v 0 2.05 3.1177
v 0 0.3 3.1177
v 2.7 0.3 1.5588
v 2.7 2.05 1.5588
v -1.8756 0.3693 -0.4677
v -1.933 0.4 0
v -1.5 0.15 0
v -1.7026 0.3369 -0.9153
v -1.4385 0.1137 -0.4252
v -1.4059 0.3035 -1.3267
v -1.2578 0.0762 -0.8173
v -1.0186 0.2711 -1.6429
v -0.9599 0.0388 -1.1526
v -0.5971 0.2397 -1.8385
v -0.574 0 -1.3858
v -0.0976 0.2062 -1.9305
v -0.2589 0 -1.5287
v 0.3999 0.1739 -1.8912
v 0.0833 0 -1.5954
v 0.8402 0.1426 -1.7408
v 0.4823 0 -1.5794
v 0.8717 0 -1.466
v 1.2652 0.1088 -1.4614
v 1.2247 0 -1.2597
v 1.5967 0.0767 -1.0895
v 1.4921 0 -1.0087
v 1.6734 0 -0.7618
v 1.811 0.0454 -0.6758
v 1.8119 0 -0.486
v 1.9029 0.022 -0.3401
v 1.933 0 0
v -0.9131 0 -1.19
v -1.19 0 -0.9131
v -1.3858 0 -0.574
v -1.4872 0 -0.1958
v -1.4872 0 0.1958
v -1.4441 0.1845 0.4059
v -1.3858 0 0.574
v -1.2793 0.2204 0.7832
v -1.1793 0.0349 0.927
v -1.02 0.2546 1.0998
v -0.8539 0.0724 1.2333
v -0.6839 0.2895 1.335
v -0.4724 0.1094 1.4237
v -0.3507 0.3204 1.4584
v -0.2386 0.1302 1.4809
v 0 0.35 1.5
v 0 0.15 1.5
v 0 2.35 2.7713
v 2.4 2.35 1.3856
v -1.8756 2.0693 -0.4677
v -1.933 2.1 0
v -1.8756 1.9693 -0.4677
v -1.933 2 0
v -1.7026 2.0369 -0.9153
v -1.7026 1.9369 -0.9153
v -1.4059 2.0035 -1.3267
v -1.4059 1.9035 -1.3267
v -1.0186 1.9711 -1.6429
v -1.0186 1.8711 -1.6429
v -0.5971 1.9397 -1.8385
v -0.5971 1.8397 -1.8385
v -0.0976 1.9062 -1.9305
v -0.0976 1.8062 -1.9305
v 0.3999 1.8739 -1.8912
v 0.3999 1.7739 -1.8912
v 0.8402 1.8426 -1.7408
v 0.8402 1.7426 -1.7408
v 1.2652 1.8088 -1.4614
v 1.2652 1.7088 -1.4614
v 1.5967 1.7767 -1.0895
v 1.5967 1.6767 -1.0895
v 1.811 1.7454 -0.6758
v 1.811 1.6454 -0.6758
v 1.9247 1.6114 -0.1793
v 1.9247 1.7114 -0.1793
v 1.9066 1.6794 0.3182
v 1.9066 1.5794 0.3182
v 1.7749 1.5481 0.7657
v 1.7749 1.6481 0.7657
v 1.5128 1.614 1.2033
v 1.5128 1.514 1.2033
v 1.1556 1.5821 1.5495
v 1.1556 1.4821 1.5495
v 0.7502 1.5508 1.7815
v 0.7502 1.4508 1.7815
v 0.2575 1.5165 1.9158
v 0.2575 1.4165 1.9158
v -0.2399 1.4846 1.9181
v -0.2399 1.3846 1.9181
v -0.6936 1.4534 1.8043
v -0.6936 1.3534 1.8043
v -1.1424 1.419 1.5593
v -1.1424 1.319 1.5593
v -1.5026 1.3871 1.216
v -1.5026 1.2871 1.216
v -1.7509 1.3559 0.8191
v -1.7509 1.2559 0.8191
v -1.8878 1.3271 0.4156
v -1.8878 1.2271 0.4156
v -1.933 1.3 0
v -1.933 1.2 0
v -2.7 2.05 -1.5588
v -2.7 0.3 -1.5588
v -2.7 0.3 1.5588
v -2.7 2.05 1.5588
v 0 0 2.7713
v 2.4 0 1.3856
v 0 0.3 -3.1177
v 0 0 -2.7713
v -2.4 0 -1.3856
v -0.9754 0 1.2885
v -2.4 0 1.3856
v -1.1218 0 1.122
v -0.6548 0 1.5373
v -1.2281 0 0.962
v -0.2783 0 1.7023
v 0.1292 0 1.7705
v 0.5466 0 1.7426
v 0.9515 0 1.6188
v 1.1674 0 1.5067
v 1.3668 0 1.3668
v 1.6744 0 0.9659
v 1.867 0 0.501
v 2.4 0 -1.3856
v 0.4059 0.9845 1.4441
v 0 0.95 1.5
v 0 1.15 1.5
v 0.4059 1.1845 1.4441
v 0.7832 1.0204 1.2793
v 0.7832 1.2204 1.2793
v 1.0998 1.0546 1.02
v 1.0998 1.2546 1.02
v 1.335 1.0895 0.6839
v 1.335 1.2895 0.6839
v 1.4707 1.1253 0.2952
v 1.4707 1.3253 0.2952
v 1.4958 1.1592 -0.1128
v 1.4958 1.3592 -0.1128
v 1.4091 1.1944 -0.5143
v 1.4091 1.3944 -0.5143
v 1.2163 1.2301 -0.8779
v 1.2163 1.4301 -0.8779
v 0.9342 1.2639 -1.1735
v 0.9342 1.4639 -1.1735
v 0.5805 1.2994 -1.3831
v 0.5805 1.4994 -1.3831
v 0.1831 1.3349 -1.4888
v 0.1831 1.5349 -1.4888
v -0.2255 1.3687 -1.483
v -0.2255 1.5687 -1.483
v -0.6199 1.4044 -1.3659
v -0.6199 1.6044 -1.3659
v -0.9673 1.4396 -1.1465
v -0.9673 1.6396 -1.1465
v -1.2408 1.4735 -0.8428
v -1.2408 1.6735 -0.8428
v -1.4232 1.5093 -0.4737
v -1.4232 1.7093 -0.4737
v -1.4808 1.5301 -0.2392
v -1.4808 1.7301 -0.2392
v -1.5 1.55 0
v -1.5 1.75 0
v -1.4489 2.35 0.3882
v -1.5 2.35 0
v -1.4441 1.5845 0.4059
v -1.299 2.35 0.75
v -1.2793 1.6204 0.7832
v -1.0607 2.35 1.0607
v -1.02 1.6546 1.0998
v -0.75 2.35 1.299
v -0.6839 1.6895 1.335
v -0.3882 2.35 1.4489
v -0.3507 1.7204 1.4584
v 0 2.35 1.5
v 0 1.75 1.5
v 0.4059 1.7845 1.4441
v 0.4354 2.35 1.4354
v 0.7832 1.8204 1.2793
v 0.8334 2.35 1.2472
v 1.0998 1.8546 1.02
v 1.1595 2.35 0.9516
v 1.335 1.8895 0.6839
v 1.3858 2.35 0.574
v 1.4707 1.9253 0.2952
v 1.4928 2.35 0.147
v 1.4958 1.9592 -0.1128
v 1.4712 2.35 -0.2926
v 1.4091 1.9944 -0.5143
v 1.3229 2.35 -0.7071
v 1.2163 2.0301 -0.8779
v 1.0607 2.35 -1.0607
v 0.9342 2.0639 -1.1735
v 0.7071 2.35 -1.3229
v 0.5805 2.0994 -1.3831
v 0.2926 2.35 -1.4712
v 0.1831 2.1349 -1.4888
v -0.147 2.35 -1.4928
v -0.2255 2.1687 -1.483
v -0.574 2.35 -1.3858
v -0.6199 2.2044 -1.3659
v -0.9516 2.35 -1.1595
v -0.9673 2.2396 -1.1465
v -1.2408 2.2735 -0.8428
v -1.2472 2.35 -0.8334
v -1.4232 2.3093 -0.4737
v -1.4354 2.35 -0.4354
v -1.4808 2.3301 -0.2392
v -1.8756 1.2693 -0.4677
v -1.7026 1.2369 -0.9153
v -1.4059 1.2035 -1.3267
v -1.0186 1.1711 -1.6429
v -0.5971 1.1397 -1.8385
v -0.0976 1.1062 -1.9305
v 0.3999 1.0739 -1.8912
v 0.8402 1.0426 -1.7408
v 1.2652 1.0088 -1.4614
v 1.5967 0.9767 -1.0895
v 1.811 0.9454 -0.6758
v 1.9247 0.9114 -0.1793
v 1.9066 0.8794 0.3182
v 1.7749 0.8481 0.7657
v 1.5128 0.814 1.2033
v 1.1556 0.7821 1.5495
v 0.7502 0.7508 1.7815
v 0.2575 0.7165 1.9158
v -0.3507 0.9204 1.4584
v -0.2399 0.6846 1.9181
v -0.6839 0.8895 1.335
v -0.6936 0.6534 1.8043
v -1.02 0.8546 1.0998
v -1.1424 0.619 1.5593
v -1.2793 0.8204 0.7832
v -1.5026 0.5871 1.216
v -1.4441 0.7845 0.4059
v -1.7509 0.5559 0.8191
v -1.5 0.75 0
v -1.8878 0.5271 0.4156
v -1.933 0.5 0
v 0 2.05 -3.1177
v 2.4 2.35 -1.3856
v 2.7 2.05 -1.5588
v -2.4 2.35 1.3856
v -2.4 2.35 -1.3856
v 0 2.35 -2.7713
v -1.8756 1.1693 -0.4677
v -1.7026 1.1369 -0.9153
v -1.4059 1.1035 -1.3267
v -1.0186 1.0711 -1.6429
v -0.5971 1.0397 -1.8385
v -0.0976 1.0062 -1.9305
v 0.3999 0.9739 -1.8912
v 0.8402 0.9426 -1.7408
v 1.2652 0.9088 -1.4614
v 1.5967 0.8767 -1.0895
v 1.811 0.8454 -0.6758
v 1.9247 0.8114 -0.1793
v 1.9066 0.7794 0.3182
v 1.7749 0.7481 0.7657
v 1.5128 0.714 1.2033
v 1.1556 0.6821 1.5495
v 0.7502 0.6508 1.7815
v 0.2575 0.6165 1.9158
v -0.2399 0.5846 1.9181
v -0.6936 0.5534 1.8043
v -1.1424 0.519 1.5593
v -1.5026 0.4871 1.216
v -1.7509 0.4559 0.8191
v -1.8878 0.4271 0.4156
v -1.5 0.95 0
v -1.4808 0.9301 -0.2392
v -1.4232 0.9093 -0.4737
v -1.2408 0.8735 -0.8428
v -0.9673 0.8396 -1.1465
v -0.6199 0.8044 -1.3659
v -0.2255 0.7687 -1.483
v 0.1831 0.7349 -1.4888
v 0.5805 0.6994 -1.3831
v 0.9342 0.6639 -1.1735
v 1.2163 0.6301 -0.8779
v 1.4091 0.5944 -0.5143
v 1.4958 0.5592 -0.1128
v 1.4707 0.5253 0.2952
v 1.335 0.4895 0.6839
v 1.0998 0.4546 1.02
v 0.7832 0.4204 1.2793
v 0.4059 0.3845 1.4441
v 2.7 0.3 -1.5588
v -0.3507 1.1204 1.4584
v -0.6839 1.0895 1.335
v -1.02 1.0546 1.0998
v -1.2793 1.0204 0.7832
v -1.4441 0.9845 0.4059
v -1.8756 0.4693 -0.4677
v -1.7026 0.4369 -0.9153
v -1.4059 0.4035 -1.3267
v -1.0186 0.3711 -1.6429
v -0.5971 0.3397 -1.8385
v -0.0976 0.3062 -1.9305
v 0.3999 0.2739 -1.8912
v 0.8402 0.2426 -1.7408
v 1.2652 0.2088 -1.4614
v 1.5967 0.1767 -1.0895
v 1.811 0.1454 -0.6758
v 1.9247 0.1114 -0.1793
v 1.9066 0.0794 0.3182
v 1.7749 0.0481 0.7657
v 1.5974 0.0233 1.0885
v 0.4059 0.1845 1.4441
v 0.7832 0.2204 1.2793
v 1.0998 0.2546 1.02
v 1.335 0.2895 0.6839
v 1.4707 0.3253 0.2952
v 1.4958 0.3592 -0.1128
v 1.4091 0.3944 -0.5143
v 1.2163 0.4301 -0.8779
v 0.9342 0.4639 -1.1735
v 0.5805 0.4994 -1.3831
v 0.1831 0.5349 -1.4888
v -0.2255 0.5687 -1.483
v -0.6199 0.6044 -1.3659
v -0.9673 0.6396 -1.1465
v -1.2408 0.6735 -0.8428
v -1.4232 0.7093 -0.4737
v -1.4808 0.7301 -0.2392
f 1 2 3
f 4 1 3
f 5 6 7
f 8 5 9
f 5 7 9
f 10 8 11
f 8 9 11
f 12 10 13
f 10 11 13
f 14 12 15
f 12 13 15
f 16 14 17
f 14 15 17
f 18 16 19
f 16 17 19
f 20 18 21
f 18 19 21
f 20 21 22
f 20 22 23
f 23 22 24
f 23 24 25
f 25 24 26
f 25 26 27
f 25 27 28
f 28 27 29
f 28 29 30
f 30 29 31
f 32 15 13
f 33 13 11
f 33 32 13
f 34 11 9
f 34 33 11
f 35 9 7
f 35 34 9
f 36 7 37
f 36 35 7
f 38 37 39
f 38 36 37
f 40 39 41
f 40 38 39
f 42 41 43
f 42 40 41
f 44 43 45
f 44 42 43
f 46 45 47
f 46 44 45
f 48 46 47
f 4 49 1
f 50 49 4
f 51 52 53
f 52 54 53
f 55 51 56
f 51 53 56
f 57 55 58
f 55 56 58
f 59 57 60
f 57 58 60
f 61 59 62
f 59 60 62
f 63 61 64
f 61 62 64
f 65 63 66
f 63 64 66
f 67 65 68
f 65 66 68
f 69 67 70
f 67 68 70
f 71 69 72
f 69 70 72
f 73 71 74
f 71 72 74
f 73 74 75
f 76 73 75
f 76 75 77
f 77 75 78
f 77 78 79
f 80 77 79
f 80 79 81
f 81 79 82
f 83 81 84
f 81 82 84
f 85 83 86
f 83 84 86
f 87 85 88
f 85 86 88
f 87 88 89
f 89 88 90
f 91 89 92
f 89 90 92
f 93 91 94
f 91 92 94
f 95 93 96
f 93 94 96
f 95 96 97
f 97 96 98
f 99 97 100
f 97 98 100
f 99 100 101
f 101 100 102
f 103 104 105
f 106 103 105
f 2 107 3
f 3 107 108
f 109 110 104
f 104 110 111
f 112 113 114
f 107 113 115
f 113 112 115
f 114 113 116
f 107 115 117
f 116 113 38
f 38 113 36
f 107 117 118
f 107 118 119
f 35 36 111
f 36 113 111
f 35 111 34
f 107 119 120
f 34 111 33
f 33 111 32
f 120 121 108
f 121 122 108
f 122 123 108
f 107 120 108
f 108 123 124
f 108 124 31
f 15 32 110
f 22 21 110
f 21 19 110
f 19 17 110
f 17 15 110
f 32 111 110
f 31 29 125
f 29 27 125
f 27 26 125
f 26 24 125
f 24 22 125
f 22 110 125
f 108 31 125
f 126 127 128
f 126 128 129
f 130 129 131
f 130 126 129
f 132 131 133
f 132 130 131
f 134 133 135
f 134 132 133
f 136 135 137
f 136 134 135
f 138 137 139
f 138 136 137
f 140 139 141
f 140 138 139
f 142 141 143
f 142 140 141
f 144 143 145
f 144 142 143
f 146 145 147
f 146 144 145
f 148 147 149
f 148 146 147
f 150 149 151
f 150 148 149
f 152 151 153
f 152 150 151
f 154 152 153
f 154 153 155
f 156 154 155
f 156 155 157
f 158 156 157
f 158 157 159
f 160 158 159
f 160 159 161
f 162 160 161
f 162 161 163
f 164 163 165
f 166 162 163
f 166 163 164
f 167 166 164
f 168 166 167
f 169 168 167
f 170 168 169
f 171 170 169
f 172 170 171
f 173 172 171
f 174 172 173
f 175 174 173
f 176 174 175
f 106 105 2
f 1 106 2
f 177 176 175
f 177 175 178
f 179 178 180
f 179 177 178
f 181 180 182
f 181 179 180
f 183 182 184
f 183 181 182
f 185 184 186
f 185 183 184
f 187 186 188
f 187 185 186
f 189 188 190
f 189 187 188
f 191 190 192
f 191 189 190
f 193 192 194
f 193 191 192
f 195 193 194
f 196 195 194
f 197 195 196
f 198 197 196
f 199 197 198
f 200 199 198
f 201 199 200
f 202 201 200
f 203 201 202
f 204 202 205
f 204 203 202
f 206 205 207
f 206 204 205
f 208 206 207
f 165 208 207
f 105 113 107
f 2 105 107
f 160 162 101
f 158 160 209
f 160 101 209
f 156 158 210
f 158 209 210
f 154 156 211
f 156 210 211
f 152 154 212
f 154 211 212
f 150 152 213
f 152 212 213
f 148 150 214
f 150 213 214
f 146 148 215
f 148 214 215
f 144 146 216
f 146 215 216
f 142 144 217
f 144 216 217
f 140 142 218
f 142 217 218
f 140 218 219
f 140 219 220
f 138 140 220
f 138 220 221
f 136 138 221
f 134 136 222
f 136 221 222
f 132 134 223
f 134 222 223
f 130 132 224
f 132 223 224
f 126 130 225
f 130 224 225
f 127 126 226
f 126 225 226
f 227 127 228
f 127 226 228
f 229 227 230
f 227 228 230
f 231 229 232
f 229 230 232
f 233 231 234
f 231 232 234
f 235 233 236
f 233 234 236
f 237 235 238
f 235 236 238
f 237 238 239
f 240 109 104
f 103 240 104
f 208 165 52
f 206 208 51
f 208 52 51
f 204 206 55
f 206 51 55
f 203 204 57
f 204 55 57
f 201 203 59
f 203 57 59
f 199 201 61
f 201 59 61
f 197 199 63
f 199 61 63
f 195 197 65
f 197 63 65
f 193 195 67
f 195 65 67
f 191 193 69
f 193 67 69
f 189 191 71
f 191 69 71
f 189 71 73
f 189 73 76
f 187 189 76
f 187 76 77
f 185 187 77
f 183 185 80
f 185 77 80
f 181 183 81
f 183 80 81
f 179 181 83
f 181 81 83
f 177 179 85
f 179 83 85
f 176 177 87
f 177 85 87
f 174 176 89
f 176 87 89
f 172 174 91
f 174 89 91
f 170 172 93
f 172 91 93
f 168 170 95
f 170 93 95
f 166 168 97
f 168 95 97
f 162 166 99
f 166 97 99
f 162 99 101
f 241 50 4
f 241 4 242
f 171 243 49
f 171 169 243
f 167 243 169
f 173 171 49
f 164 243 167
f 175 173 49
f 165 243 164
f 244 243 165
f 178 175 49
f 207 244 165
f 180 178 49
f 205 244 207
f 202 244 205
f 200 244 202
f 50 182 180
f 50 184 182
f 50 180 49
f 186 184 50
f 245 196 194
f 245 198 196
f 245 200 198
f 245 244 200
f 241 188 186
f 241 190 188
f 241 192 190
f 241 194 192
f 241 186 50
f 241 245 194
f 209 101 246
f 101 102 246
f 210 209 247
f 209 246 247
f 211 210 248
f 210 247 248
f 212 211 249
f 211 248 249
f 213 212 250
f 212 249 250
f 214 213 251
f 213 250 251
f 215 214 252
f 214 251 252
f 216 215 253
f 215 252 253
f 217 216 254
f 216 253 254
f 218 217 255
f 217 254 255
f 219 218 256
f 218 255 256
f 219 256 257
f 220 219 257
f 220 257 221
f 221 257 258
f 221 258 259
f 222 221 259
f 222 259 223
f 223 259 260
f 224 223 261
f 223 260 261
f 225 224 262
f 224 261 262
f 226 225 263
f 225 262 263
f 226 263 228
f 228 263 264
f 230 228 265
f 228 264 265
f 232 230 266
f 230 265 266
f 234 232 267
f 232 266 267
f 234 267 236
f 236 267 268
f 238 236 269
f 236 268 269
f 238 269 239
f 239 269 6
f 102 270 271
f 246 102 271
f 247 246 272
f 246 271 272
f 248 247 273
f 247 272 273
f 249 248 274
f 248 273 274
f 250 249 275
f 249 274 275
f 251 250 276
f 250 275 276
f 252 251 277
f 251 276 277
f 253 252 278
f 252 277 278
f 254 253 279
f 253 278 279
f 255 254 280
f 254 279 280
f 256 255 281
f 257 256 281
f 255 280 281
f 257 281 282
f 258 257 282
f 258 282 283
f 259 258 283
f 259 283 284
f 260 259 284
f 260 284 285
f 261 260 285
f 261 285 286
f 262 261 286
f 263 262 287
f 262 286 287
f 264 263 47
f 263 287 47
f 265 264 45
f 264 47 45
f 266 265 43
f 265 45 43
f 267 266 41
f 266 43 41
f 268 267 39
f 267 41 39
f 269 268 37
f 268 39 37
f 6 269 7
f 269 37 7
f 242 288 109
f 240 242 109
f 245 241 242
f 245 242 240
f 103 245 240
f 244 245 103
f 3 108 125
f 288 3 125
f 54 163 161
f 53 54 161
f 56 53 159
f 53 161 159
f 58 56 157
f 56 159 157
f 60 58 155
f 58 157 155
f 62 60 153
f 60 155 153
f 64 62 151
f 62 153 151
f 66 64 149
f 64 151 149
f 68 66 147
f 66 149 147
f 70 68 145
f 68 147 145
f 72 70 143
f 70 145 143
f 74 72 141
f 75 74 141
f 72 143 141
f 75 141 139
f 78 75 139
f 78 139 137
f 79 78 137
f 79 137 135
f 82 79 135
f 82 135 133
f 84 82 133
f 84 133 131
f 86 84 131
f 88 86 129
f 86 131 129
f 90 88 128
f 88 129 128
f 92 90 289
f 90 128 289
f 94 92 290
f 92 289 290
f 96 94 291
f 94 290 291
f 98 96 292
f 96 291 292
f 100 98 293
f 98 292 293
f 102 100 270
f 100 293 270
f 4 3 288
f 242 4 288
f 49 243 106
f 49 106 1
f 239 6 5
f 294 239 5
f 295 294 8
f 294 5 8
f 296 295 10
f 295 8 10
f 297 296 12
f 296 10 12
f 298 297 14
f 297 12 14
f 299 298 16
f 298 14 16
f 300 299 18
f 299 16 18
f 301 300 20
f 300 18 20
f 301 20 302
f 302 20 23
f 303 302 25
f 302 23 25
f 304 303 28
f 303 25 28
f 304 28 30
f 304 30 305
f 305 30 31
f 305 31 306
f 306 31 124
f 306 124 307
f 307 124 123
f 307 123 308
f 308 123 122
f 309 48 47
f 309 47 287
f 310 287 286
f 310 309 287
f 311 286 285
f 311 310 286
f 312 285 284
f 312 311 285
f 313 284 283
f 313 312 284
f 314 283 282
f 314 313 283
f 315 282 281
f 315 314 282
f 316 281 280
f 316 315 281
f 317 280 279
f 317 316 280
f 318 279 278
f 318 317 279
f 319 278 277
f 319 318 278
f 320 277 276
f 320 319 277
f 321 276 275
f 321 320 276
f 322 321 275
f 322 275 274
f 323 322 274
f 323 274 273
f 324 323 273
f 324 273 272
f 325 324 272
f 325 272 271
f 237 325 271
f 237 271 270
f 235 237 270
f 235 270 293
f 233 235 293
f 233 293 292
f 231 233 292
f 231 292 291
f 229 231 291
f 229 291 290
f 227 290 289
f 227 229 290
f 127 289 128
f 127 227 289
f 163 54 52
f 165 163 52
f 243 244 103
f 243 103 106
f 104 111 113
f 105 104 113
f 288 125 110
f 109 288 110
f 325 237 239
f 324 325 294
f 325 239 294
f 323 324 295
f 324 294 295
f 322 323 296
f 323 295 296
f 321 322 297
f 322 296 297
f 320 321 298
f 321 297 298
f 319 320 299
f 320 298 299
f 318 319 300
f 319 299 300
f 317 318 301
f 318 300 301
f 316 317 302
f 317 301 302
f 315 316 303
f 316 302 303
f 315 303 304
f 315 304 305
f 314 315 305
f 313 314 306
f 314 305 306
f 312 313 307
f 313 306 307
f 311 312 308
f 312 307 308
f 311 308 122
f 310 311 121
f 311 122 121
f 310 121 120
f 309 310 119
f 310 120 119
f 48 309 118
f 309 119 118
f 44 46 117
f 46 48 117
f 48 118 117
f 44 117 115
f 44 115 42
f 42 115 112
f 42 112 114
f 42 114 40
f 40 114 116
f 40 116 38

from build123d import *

# Parameters (mm, degrees)
SKETCH_1_R      = 1.5
EXTRUDE_1_DEPTH = 2.35
CHAMFER_1_SIZE  = 0.3
THREAD_1_PITCH  = 0.8


with BuildPart() as part:
    # Sketch 1 → 凸台-拉伸1 (new body)
    with BuildSketch(Plane(origin=(0, 0, 0), x_dir=(1, 0, 0), z_dir=(0, 1, 0))):
        Polygon((0, 3.117691454), (-2.7, 1.558845727), (-2.7, -1.558845727), (0, -3.117691454), (2.7, -1.558845727), (2.7, 1.558845727), align=None)
        with Locations(Location((0, 0, 0), (0, 0, 270))):
            Circle(SKETCH_1_R, mode=Mode.SUBTRACT)
    extrude(amount=EXTRUDE_1_DEPTH)

    # 倒角1
    chamfer_1_edges = [part.edges().sort_by_distance(p)[0] for p in [
        (-2.7, 2.35, 0),
        (-1.35, 2.35, 2.33826859),
        (1.35, 2.35, 2.33826859),
        (2.7, 2.35, 0),
        (1.35, 2.35, -2.33826859),
        (2.7, 0, 0),
        (1.35, 0, 2.33826859),
        (-1.35, 0, 2.33826859),
        (-1.35, 2.35, -2.33826859),
        (-2.7, 0, 0),
        (-1.35, 0, -2.33826859),
        (1.35, 0, -2.33826859),
    ]]
    chamfer(chamfer_1_edges, length=CHAMFER_1_SIZE)

    # 螺纹线1: the profile of Sketch 1 2 profile screwed along a right-hand helix of 2.9375 turns, 8 arcs to a turn; built about Z, then put on its axis
    thread_1_z = Axis((0, 0, 0), (0, 0, 1))
    thread_1_corners = [(1.4997, 0, -0.000173205), (1.9330127, 0, 0.249999999), (1.9330127, 0, 0.349999999), (1.4997, 0, 0.600173203)]
    with BuildLine(mode=Mode.PRIVATE) as thread_1_profile:
        Line(thread_1_corners[0], thread_1_corners[1])
        Line(thread_1_corners[1], thread_1_corners[2])
        Line(thread_1_corners[2], thread_1_corners[3])
        Line(thread_1_corners[3], thread_1_corners[0])
    thread_1_cap = Face(thread_1_profile.wire())
    thread_1_turn_angles = [0, 22.5, 45, 67.5, 90, 112.5, 135, 157.5, 180, 202.5, 225, 247.5, 270, 292.5, 315, 337.5, 360]
    thread_1_turn_weights = [1, 0.9238795325112867, 1, 0.9238795325112867, 1, 0.9238795325112867, 1, 0.9238795325112867, 1, 0.9238795325112867, 1, 0.9238795325112867, 1, 0.9238795325112867, 1, 0.9238795325112867, 1]
    thread_1_turn_rails = [Edge.make_bspline([Vector(p[0], p[1], 0).rotate(thread_1_z, thread_1_turn_angles[k]) / thread_1_turn_weights[k] + Vector(0, 0, p[2] + THREAD_1_PITCH * thread_1_turn_angles[k] / 360) for k in range(17)], [0, 0, 0, 1, 1, 2, 2, 3, 3, 4, 4, 5, 5, 6, 6, 7, 7, 8, 8, 8], 2, thread_1_turn_weights) for p in thread_1_corners]
    thread_1_turn_sides = [Face.make_surface_from_curves(thread_1_turn_rails[p[0]], thread_1_turn_rails[p[1]]) for p in [(0, 1), (1, 2), (2, 3), (3, 0)]]
    thread_1_last_angles = [720, 742.5, 765, 787.5, 810, 832.5, 855, 877.5, 900, 922.5, 945, 967.5, 990, 1012.5, 1035, 1046.25, 1057.5]
    thread_1_last_weights = [1, 0.9238795325112867, 1, 0.9238795325112867, 1, 0.9238795325112867, 1, 0.9238795325112867, 1, 0.9238795325112867, 1, 0.9238795325112867, 1, 0.9238795325112867, 1, 0.9807852804032304, 1]
    thread_1_last_rails = [Edge.make_bspline([Vector(p[0], p[1], 0).rotate(thread_1_z, thread_1_last_angles[k]) / thread_1_last_weights[k] + Vector(0, 0, p[2] + THREAD_1_PITCH * thread_1_last_angles[k] / 360) for k in range(17)], [0, 0, 0, 1, 1, 2, 2, 3, 3, 4, 4, 5, 5, 6, 6, 7, 7, 8, 8, 8], 2, thread_1_last_weights) for p in thread_1_corners]
    thread_1_last_sides = [Face.make_surface_from_curves(thread_1_last_rails[p[0]], thread_1_last_rails[p[1]]) for p in [(0, 1), (1, 2), (2, 3), (3, 0)]]
    thread_1 = Plane(origin=(0, 2.35, 0), x_dir=(-1, 0, 0), z_dir=(0, -1, 0)) * Solid(Shell([*[p.moved(Location((0, 0, THREAD_1_PITCH * i))) for i in range(2) for p in thread_1_turn_sides], *thread_1_last_sides, thread_1_cap, thread_1_cap.rotate(thread_1_z, 1057.5).moved(Location((0, 0, THREAD_1_PITCH * 1057.5 / 360)))]))
    add(thread_1, mode=Mode.SUBTRACT)


solid = part.part
